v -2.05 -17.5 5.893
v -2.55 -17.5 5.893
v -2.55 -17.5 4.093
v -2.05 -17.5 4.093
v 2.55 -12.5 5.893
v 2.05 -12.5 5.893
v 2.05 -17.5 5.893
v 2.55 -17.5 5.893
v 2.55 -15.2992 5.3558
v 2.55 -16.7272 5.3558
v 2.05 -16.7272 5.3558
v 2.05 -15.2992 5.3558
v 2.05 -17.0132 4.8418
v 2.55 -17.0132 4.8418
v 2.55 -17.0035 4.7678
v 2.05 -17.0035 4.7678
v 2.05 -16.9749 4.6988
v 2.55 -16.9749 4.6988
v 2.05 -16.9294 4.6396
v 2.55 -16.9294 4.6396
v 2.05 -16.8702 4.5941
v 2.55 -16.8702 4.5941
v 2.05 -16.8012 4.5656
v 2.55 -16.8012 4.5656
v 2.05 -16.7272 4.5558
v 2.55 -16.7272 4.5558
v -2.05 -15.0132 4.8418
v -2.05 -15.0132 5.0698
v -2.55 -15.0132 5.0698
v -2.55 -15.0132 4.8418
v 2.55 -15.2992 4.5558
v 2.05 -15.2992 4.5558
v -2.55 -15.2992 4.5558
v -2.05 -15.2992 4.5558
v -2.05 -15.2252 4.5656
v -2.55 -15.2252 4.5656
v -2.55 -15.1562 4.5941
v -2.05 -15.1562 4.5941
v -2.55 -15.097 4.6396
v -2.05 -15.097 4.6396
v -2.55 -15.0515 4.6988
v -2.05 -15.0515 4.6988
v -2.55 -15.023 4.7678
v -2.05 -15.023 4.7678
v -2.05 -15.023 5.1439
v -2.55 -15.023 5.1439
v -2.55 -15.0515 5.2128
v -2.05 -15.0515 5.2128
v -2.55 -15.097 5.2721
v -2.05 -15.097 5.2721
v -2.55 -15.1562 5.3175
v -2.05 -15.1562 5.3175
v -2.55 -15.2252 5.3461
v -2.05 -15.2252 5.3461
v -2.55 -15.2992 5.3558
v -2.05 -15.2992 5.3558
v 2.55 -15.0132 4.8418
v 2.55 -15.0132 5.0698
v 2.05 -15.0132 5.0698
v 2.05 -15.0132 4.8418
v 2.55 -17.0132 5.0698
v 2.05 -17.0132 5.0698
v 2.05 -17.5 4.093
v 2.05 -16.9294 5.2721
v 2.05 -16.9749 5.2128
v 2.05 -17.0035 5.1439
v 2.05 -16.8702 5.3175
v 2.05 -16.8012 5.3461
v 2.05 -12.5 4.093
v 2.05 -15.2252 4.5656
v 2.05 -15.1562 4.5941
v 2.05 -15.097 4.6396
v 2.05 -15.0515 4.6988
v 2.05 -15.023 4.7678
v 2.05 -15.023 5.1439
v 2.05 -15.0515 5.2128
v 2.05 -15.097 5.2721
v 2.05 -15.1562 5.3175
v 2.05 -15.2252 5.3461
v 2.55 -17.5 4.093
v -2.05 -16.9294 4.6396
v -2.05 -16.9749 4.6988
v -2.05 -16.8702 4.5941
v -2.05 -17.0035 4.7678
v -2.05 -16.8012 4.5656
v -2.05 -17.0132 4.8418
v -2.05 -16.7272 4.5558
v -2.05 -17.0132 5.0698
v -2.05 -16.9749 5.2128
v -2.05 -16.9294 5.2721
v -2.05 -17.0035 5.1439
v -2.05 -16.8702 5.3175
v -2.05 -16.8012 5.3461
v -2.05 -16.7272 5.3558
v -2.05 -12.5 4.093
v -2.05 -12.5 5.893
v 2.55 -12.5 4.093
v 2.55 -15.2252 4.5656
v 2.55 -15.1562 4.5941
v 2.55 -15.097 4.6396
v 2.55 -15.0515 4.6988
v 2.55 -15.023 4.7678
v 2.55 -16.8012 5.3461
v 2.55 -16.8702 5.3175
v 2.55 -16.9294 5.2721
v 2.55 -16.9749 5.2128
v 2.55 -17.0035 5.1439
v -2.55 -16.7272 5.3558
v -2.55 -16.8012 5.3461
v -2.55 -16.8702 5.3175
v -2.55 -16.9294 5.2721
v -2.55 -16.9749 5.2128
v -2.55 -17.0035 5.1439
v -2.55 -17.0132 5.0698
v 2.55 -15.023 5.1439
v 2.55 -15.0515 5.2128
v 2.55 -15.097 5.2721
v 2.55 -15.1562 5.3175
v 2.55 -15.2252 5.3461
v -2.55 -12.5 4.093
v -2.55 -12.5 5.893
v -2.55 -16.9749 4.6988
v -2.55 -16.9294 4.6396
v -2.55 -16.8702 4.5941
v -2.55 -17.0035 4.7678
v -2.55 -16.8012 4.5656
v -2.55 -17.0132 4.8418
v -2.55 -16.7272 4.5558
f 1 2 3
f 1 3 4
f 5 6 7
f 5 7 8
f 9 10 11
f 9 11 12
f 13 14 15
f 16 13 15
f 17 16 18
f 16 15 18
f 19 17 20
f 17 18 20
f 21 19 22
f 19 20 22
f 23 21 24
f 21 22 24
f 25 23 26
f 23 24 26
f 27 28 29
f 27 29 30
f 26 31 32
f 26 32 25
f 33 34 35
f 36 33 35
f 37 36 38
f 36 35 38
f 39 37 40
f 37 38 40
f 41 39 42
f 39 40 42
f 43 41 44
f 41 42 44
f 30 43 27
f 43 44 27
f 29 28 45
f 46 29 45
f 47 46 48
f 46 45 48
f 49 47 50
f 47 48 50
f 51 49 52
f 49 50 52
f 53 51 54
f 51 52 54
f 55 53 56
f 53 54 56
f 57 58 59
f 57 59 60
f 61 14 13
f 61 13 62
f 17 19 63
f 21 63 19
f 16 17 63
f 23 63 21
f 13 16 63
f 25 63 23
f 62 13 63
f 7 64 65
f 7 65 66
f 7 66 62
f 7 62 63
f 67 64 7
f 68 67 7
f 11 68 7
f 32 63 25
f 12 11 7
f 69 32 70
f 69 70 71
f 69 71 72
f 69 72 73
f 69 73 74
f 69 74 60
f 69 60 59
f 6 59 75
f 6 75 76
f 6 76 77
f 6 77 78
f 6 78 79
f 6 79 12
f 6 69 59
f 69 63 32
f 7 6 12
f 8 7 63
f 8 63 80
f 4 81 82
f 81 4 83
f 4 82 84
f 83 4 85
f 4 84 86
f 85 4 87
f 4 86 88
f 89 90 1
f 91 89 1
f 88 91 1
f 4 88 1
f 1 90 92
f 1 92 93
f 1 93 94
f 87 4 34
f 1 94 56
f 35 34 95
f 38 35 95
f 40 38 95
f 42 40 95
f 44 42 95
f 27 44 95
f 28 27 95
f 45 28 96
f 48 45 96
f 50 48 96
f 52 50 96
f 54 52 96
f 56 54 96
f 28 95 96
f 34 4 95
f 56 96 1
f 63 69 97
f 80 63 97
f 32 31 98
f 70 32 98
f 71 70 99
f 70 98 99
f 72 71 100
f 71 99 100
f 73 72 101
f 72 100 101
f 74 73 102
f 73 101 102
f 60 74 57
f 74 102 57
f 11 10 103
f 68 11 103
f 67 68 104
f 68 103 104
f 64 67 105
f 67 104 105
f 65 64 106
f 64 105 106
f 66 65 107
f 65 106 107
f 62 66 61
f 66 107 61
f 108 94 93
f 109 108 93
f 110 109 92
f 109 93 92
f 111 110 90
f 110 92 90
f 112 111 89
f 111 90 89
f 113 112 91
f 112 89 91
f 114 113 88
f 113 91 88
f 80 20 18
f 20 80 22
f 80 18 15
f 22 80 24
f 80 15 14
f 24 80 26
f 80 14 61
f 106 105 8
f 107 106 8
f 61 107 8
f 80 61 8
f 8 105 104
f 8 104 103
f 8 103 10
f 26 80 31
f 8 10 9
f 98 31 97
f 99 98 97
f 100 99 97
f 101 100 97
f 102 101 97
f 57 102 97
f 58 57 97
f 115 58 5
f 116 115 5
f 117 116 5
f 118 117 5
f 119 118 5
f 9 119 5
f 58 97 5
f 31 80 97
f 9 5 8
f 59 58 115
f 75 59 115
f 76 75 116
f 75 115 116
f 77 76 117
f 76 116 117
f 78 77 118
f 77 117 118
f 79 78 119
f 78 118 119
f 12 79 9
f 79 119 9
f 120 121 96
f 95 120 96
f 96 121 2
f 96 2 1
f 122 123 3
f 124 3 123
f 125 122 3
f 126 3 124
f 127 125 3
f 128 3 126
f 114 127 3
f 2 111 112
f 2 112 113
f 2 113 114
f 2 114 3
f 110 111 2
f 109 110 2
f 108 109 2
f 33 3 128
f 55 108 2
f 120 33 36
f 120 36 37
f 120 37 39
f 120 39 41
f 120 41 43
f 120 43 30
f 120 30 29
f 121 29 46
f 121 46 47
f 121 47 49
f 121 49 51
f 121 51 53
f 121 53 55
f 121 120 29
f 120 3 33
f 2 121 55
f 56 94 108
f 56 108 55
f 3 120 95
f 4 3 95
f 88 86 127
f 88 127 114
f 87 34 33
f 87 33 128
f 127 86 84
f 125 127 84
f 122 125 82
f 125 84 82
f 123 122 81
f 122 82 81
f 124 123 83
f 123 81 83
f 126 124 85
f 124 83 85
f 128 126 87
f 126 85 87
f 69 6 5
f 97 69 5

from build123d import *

# Parameters (mm, degrees)
EXTRUDE007_DEPTH = 10
SKETCH009_W      = 0.5
SKETCH009_H      = 1.8
EXTRUDE006_DEPTH = 5


with BuildPart() as extrude007:
    # Sketch010 (on Face1 of Extrude006) → Extrude007 (new body, symmetric)
    with BuildSketch(Plane.YZ.offset(2.55)):
        with BuildLine():
            Line((-16.727232, 5.355817), (-15.299188, 5.355817))
            ThreePointArc((-15.01321, 5.069839), (-15.096971, 5.272056), (-15.299188, 5.355817))
            Line((-15.01321, 5.069839), (-15.01321, 4.841795))
            ThreePointArc((-15.299188, 4.555817), (-15.096971, 4.639578), (-15.01321, 4.841795))
            Line((-15.299188, 4.555817), (-16.727232, 4.555817))
            ThreePointArc((-17.01321, 4.841795), (-16.929449, 4.639578), (-16.727232, 4.555817))
            Line((-17.01321, 4.841795), (-17.01321, 5.069839))
            ThreePointArc((-16.727232, 5.355817), (-16.929449, 5.272056), (-17.01321, 5.069839))
        make_face()
    extrude(amount=EXTRUDE007_DEPTH, both=True)


with BuildPart() as cut002:
    # Sketch009 (on Face3 of Extrude005) → Extrude006 (new body)
    with BuildSketch(Plane.XZ.offset(12.5)):
        with Locations((-2.3, 4.992954)):
            Rectangle(SKETCH009_W, SKETCH009_H)
        with Locations((2.3, 4.992954)):
            Rectangle(SKETCH009_W, SKETCH009_H)
    extrude(amount=EXTRUDE006_DEPTH)

    # Cut002: cut Extrude007
    add(extrude007.part, mode=Mode.SUBTRACT)


solid = cut002.part
